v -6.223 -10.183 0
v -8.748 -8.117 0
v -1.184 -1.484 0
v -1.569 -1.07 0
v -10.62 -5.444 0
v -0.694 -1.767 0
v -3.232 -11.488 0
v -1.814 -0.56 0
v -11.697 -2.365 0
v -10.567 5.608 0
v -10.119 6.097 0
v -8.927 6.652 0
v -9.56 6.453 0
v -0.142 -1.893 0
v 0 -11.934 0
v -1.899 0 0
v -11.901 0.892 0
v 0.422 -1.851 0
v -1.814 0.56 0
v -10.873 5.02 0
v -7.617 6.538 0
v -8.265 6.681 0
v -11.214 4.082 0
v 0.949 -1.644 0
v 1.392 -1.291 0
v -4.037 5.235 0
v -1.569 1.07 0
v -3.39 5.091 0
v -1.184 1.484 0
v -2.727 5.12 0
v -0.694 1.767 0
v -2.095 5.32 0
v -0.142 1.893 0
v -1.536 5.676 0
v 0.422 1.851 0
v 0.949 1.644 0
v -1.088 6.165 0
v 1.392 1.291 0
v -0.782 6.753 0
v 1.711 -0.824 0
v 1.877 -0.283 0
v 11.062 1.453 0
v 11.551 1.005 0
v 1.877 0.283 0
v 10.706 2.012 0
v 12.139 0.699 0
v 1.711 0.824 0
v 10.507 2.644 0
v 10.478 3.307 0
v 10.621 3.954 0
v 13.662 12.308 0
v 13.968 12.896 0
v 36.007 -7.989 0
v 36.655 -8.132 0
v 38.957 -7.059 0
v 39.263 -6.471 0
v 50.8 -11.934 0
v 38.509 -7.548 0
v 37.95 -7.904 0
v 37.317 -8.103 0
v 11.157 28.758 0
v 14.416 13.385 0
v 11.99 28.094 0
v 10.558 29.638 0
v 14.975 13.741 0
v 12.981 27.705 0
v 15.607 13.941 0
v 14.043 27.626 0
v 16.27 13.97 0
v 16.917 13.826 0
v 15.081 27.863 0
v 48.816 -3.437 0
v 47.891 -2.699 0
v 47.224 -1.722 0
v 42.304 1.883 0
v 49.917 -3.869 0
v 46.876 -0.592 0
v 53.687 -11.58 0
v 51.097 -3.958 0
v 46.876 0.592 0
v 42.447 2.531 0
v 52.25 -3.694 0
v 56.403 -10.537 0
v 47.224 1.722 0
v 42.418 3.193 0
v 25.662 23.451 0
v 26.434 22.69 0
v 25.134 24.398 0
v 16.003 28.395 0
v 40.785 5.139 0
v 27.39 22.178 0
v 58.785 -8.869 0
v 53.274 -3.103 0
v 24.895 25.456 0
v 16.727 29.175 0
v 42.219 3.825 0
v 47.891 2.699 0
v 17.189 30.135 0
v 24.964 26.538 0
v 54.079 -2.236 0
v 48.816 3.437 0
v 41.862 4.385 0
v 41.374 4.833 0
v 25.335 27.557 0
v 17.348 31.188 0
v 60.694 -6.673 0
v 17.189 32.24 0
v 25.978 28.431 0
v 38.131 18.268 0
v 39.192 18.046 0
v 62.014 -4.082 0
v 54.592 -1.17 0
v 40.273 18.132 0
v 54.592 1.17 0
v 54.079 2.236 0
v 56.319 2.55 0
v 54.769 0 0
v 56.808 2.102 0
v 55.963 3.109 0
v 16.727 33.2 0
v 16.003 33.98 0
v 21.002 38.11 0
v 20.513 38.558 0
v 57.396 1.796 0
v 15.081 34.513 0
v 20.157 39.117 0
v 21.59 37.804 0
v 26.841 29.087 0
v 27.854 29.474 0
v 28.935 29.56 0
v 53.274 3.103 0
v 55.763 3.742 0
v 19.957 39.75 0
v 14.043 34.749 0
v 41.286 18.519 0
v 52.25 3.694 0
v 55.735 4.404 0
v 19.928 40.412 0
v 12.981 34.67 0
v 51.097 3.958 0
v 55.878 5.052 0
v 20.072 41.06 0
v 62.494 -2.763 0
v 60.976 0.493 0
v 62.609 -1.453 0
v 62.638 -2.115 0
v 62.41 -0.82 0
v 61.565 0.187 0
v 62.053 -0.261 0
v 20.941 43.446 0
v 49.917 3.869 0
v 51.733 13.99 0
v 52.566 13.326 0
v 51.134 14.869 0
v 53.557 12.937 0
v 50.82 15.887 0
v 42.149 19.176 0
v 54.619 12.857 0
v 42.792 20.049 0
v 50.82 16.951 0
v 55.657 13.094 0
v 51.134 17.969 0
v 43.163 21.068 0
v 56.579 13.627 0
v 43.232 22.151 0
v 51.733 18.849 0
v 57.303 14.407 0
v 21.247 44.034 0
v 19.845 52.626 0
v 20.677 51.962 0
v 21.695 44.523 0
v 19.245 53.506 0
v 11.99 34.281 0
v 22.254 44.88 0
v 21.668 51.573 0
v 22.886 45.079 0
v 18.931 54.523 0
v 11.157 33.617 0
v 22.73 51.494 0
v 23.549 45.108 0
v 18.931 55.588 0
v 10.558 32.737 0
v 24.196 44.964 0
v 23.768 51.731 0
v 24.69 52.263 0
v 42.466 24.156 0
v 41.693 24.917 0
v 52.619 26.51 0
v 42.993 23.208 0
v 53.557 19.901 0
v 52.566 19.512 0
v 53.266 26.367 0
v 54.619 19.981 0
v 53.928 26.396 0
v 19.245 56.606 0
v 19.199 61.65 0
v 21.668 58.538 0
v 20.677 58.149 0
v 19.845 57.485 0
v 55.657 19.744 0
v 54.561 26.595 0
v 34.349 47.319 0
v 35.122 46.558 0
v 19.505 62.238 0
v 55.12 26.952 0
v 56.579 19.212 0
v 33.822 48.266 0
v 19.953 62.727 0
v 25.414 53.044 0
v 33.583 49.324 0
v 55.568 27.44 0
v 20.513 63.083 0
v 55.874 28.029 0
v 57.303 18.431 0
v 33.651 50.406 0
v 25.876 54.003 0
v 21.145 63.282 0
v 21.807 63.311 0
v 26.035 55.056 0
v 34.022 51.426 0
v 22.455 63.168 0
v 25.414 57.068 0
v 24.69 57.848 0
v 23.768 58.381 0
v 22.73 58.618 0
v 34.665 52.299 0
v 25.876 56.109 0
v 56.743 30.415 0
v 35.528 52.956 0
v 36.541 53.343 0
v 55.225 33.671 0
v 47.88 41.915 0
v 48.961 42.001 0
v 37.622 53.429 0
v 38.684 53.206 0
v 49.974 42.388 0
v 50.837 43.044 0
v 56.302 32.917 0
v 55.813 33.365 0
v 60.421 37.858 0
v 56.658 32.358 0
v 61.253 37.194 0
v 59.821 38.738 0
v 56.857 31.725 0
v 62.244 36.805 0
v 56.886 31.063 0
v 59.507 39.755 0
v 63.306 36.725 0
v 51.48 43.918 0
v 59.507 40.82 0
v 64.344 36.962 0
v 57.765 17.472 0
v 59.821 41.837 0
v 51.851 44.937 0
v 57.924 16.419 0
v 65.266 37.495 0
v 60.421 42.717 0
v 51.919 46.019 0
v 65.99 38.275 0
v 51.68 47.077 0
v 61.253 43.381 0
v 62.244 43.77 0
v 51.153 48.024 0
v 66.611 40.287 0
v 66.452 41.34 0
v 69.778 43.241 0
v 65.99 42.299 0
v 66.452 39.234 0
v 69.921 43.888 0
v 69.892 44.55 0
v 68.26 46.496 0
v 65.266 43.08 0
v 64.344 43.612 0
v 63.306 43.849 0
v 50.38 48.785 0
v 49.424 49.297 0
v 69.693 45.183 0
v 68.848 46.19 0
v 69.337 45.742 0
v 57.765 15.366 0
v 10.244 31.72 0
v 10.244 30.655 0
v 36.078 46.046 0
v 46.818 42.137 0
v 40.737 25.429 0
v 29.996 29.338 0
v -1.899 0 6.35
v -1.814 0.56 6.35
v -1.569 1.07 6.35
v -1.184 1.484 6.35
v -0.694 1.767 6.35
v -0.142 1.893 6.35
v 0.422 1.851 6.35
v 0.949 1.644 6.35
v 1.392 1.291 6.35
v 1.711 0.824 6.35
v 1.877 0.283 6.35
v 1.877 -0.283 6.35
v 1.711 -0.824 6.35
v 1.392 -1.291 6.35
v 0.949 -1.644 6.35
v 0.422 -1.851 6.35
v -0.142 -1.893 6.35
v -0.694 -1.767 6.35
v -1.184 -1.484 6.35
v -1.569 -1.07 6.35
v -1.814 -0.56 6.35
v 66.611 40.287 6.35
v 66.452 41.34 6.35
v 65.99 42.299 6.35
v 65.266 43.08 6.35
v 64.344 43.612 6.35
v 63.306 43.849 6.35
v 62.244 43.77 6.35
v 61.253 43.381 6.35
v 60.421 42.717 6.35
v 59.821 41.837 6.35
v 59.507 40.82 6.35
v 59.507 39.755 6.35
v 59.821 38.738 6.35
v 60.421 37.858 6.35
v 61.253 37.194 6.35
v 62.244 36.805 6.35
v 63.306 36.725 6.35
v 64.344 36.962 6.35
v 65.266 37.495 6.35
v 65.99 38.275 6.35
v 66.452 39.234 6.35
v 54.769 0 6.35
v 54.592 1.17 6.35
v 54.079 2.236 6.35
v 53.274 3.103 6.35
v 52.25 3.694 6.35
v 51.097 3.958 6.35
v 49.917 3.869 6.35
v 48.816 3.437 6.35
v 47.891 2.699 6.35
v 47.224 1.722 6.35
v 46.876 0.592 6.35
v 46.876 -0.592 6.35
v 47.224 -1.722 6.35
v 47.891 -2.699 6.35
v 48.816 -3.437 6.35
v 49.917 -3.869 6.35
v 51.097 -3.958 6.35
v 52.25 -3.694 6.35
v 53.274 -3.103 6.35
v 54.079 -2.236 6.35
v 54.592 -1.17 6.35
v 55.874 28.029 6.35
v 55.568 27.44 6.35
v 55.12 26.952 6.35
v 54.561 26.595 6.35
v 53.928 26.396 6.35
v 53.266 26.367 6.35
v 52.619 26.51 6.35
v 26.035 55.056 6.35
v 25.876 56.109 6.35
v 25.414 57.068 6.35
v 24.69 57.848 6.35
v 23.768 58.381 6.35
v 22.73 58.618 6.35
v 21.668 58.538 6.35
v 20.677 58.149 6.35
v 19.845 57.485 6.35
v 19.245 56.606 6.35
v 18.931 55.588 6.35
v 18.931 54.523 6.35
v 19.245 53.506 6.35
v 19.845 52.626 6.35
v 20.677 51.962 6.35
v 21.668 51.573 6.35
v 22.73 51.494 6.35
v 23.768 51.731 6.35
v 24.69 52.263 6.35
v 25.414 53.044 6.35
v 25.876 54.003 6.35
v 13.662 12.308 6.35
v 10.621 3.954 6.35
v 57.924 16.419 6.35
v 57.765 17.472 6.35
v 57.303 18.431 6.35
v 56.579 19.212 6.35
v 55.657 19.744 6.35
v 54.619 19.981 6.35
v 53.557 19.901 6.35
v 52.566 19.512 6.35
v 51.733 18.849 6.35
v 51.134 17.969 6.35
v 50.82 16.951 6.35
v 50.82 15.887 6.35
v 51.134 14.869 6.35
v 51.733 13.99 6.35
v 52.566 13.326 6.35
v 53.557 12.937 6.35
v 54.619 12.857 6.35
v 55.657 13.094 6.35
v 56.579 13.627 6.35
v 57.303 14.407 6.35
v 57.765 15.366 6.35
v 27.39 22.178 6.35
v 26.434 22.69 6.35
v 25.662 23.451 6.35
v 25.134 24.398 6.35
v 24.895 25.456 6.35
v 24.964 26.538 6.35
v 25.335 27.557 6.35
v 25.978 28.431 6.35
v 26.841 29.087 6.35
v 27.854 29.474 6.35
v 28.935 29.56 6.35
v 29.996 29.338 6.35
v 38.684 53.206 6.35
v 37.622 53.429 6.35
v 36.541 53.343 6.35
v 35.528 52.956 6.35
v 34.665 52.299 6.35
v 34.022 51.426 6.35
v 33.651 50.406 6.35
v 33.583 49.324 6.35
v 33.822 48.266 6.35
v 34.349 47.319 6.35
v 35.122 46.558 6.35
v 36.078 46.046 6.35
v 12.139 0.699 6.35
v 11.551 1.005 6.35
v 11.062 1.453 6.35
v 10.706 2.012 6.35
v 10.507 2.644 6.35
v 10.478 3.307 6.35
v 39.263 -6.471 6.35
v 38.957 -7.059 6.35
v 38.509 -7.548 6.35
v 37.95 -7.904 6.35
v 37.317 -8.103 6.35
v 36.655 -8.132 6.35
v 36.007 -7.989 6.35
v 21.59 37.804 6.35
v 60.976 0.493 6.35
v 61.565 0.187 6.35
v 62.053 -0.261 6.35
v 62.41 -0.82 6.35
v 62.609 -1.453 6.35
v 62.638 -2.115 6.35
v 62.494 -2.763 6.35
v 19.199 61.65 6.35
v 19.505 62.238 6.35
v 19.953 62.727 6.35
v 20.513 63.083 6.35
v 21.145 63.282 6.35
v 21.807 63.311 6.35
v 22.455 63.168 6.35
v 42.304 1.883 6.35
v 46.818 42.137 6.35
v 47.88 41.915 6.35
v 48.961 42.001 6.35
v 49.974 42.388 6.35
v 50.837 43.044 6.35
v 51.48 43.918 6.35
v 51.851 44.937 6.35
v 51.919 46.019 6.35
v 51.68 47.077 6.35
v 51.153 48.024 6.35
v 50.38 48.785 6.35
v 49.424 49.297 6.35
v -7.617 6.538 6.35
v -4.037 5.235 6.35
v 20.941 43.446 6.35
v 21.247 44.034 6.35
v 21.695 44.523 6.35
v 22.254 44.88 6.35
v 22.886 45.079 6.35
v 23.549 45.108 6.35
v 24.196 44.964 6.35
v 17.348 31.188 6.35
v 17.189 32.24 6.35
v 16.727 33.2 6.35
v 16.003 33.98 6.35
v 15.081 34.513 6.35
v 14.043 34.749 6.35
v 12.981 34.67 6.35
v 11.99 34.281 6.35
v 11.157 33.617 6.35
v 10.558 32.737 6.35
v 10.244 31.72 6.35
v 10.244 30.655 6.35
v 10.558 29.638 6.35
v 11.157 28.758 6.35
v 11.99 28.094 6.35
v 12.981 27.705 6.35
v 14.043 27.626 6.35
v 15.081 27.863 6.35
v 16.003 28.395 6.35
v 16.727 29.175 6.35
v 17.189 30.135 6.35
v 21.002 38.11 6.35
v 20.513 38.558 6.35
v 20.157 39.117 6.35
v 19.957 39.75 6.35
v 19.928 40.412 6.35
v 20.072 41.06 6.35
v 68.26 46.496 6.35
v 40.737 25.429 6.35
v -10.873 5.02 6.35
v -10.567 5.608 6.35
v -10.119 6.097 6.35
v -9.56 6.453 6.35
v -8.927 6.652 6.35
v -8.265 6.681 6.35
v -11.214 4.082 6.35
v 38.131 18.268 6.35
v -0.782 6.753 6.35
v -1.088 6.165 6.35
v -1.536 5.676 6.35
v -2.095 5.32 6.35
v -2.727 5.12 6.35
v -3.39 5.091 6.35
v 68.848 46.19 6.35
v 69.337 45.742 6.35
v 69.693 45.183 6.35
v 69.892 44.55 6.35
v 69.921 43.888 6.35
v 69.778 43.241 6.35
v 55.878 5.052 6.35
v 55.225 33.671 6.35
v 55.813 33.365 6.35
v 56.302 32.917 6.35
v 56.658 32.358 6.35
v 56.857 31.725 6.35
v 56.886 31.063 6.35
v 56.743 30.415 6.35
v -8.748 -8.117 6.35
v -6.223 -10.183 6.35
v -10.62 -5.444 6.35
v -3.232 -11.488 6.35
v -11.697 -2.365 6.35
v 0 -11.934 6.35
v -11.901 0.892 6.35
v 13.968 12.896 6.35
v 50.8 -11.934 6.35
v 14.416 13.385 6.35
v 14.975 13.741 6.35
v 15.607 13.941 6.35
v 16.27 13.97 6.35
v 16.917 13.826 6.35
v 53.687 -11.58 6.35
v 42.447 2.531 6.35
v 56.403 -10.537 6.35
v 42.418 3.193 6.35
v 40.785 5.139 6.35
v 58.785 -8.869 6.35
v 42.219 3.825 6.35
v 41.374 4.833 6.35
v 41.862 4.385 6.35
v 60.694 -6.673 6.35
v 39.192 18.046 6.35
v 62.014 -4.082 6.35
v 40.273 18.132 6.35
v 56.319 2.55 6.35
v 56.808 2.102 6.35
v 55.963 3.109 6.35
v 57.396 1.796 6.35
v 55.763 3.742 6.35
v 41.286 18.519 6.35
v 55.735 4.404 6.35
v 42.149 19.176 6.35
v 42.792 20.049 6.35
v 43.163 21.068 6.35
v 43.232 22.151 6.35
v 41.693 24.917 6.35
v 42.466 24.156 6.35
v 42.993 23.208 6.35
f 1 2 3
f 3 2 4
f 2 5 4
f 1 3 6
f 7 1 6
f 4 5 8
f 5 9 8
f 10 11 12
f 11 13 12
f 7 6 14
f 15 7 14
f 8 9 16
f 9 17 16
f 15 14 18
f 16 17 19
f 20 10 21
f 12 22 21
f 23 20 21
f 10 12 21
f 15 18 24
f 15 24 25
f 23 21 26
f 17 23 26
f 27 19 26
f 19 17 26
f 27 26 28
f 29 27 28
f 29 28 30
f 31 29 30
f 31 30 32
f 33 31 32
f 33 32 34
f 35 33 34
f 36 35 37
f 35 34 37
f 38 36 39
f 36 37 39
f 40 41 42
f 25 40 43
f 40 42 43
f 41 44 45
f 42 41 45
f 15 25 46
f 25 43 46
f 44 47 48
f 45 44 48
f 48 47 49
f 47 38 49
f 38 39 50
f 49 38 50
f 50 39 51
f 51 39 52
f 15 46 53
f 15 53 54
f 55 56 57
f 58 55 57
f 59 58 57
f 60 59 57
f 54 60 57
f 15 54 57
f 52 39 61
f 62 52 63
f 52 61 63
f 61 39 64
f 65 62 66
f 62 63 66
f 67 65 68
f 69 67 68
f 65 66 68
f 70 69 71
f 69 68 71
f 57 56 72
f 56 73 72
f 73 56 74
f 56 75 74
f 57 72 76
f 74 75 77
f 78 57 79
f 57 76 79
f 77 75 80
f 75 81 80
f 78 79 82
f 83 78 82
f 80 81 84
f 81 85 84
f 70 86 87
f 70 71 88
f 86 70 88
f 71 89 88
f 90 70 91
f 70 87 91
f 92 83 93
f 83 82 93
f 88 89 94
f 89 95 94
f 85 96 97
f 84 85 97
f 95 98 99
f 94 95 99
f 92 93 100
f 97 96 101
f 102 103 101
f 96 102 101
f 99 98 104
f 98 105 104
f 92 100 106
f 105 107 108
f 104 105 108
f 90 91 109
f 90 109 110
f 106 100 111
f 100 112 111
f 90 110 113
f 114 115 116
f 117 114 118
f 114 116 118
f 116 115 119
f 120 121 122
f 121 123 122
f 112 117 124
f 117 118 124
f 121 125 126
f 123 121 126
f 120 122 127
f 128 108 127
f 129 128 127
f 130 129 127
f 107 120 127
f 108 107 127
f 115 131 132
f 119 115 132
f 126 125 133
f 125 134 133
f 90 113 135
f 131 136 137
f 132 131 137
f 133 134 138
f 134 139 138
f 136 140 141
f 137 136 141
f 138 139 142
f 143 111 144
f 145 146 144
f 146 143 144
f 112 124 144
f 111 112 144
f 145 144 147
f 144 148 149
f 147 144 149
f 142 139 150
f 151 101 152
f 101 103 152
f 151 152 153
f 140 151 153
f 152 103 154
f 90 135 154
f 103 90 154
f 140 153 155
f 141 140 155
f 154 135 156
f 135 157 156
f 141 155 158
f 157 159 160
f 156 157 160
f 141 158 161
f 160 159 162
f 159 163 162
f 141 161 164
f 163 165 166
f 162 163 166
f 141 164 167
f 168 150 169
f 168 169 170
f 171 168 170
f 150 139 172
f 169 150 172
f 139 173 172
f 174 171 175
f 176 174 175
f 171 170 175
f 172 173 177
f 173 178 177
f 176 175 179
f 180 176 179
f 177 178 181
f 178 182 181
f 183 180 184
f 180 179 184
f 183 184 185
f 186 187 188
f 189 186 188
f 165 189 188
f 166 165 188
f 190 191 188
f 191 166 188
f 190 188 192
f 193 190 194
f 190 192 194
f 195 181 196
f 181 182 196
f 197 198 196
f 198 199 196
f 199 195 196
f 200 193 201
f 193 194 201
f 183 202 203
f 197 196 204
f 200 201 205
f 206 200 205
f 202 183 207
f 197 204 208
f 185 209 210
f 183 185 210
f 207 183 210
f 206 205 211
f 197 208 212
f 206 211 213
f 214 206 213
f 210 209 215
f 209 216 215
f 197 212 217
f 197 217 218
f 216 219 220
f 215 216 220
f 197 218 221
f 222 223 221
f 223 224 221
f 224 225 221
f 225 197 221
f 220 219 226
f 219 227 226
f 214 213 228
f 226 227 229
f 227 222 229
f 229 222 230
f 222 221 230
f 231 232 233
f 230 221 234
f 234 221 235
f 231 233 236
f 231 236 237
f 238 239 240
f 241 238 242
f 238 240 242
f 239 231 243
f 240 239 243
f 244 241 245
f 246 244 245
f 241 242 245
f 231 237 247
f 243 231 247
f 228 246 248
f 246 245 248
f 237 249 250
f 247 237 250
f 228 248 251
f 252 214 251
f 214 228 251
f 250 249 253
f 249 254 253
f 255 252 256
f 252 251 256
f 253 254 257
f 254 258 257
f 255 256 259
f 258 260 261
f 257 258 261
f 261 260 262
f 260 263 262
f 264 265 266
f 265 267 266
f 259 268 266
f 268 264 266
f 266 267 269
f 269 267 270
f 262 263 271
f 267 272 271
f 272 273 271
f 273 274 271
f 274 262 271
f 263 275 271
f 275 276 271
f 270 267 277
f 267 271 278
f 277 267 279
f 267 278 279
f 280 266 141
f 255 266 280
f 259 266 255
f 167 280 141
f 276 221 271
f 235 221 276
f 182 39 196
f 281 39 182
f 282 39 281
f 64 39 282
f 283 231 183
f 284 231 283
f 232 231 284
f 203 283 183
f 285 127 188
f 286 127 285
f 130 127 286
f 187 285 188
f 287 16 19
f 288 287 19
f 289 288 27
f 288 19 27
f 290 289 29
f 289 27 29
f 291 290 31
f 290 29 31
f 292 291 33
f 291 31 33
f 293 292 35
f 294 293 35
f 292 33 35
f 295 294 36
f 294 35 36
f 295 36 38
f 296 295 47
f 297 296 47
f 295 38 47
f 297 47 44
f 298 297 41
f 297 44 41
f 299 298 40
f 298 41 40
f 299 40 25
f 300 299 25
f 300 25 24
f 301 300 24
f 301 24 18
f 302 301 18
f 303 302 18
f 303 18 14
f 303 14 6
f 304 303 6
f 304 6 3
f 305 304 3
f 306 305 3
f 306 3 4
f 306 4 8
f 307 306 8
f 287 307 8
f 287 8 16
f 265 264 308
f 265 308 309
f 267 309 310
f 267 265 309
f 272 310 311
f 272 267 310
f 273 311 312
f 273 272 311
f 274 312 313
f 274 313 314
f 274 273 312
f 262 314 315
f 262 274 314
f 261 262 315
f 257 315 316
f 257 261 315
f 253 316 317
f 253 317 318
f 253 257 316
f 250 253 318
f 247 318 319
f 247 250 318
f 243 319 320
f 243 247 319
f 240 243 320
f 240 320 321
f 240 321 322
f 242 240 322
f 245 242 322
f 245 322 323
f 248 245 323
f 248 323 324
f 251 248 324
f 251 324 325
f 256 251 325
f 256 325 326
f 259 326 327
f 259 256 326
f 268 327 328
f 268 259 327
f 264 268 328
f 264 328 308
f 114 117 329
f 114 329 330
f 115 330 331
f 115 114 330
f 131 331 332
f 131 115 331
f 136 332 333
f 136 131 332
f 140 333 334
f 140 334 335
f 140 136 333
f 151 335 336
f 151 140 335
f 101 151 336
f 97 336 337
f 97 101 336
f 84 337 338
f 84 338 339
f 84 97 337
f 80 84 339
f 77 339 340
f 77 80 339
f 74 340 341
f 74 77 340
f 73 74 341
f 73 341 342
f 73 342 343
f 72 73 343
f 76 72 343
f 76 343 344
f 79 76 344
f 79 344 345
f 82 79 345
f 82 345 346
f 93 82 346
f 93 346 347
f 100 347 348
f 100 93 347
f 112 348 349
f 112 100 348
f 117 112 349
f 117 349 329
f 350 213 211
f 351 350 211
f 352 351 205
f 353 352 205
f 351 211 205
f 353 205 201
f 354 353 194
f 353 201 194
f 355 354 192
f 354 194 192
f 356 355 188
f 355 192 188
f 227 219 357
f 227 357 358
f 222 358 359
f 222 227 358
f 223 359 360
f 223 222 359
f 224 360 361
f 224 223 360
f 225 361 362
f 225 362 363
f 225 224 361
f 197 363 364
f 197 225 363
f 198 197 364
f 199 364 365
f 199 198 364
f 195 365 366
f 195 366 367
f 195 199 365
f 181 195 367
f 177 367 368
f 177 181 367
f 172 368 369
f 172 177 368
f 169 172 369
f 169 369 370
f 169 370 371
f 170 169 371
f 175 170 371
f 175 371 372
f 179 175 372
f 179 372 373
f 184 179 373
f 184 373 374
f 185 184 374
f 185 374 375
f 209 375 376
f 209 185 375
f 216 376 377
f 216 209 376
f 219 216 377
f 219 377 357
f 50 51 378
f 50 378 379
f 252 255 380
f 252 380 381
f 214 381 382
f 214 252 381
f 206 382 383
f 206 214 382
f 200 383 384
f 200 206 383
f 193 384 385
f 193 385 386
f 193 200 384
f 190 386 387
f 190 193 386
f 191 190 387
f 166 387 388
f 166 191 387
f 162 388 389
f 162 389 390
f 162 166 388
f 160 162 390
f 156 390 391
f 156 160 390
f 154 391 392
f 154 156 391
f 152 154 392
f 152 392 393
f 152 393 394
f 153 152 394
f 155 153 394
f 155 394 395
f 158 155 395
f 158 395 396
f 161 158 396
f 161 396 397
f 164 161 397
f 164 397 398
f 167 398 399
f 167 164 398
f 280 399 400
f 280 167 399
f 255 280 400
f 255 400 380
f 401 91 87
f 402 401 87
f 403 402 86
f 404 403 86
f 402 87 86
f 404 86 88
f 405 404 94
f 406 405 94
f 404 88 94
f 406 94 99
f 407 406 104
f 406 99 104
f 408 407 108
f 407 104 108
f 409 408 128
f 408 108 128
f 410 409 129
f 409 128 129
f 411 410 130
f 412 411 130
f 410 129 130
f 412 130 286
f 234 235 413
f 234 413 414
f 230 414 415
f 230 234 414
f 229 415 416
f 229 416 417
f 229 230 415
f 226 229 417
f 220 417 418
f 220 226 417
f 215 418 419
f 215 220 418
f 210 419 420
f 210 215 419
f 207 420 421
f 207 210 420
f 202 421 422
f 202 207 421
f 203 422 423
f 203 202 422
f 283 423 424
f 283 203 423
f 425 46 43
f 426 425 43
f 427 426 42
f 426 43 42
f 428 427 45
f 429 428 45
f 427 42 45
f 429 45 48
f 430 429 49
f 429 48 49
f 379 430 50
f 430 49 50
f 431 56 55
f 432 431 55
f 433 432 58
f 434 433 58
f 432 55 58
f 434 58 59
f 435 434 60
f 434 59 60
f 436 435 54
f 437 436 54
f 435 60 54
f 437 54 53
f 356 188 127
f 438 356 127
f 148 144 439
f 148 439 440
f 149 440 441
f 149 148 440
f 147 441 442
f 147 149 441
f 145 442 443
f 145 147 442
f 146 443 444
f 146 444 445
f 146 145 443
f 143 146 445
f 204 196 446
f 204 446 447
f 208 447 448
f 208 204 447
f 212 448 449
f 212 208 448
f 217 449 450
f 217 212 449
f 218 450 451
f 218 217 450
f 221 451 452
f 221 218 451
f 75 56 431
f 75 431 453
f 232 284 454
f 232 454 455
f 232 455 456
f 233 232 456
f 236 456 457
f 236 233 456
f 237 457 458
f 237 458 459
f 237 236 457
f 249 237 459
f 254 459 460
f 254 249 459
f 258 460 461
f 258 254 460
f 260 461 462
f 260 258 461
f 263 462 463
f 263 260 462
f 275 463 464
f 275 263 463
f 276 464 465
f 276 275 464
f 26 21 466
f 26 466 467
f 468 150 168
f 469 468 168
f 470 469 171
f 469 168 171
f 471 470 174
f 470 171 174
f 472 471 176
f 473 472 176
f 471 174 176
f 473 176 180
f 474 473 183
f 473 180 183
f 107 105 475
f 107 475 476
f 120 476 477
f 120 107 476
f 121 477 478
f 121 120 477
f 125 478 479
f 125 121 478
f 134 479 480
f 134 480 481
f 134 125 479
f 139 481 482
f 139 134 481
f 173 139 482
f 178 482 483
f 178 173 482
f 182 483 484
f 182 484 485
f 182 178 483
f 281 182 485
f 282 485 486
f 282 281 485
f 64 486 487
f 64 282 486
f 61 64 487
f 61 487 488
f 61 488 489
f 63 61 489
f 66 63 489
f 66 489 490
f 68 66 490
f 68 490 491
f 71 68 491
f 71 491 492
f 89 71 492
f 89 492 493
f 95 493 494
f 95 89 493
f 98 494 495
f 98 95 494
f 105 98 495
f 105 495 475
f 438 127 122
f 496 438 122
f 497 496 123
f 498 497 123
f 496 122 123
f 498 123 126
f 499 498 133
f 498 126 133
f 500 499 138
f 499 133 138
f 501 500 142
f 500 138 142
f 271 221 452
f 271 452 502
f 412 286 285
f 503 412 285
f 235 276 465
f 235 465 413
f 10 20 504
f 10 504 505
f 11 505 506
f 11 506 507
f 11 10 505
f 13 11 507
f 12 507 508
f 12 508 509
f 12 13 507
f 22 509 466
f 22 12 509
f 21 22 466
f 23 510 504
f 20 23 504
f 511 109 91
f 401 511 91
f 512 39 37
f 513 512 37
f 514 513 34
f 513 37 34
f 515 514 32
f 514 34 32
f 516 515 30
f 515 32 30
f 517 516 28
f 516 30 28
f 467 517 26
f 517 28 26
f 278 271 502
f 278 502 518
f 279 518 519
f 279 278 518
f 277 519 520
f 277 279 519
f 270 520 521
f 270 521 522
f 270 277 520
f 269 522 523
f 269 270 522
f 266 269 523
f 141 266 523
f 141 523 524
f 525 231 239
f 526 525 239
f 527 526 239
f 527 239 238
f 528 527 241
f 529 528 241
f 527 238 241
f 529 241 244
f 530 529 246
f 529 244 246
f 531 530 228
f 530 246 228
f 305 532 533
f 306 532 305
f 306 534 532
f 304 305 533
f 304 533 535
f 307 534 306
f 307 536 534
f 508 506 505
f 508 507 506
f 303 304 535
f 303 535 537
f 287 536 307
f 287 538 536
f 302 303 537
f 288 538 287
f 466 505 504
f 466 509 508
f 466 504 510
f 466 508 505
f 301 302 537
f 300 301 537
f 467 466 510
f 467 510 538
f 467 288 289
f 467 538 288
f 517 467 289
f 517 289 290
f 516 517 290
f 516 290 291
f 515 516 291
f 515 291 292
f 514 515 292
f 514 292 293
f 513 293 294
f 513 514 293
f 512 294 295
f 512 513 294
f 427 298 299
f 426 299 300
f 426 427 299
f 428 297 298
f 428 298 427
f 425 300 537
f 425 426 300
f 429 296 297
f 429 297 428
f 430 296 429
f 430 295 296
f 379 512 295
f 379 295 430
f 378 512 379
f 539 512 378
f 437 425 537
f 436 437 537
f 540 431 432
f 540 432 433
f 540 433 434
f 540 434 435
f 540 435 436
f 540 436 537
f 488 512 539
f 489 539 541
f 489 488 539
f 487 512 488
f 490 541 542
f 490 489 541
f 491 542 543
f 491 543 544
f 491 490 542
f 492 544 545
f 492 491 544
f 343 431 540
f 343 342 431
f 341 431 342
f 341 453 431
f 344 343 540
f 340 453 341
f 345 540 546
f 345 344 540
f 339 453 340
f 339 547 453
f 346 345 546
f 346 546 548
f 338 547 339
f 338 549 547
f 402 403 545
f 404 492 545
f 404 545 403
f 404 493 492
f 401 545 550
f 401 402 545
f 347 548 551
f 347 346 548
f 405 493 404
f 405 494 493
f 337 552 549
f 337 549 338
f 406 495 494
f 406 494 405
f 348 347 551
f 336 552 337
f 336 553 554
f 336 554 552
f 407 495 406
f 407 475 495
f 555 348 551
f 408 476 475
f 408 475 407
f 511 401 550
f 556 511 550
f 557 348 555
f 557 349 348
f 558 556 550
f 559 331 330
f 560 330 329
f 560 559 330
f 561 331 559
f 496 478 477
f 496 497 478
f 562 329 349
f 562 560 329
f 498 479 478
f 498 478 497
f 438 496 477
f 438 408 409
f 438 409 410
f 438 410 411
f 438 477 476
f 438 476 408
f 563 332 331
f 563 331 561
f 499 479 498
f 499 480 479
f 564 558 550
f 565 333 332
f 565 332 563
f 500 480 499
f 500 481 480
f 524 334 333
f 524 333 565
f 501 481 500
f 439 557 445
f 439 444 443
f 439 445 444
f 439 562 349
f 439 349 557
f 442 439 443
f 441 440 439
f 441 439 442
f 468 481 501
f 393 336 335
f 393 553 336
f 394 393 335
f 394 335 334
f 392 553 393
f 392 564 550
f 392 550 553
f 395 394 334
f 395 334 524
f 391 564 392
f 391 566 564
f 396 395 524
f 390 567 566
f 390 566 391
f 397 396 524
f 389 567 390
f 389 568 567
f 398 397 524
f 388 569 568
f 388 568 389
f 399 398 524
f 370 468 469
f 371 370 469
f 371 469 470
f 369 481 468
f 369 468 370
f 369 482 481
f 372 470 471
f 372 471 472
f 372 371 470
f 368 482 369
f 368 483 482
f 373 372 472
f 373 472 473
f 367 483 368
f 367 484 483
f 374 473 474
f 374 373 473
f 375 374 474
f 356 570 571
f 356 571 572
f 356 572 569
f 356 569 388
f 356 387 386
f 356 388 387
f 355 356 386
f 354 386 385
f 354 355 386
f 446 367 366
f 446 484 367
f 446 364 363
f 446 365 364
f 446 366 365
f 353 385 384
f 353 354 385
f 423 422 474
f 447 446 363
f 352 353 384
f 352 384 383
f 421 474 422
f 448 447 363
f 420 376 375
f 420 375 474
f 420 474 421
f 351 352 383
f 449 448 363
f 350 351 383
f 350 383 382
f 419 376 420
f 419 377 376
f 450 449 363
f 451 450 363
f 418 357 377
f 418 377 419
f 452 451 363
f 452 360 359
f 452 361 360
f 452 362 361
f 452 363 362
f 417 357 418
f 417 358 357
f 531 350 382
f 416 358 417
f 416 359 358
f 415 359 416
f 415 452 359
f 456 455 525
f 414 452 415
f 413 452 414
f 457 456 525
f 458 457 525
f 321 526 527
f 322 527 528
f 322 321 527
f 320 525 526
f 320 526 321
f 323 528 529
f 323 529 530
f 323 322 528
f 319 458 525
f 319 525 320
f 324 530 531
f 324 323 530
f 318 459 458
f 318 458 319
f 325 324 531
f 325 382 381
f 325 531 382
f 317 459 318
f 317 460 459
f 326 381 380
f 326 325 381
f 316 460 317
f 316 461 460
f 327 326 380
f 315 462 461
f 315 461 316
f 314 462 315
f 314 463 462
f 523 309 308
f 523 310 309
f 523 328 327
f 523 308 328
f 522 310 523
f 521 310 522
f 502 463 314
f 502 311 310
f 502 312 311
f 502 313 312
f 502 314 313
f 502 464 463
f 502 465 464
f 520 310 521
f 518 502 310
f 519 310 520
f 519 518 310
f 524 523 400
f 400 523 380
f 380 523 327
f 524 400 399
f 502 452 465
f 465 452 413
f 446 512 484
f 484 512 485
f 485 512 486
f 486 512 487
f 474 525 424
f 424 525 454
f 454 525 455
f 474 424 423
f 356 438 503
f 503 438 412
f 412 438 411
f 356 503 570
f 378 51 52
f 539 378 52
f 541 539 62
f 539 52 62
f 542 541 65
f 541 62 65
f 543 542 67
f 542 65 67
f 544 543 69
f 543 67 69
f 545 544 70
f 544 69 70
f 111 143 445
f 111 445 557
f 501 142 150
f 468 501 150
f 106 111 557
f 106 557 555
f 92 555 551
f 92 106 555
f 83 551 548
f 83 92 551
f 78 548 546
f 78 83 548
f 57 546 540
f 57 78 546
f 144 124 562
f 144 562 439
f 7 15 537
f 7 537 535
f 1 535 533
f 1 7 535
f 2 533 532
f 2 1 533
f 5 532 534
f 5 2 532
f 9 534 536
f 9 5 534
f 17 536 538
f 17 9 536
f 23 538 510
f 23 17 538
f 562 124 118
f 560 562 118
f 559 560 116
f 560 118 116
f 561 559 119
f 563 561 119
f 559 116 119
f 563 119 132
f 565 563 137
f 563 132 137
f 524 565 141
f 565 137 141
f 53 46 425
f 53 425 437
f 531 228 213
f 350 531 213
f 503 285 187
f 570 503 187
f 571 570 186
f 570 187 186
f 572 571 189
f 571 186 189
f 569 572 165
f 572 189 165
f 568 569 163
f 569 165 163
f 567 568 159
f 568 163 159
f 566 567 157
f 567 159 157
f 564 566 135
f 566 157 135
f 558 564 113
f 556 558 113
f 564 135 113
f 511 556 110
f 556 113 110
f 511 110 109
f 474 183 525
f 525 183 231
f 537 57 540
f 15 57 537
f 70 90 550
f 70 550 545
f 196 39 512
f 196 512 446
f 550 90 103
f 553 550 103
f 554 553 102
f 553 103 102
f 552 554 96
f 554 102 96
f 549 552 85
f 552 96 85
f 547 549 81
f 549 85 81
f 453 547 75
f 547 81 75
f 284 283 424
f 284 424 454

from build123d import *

# Parameters (mm, degrees)
SKETCH_1_R             = 3.96875
SKETCH_1_R_2           = 3.571875
BOSS_EXTRUDE1_DEPTH    = 6.35
FILLET1_R              = 2.54
F_10_24_TAPPED_HOLE1_D = 3.7973


with BuildPart() as part:
    # 草图1 → Boss-Extrude1 (new body)
    with BuildSketch(Plane.XY):
        with BuildLine():
            Line((-10.004213371, 7.406614284), (-11.214382662, 4.081701485))
            ThreePointArc((-11.214382662, 4.081701485), (-9.775839758, -6.845116691), (0, -11.934096761))
            Line((0, -11.934096761), (50.8, -11.934096761))
            ThreePointArc((50.8, -11.934096761), (57.645116629, -9.775839801), (62.014382214, -4.081701322))
            Line((62.014382214, -4.081701322), (63.363198014, -0.375860367))
            Line((63.363198014, -0.375860367), (55.009330616, 2.664698708))
            Line((55.009330616, 2.664698708), (70.64649272, 45.627444911))
            Line((70.64649272, 45.627444911), (20.067934728, 64.036536047))
            Line((20.067934728, 64.036536047), (-1.650345972, 4.36605521))
            Line((-1.650345972, 4.36605521), (-10.004213371, 7.406614284))
        make_face()
        Polygon((9.752383236, 1.567306626), (14.530404991, 14.694812411), (43.172235793, 4.270037674), (38.394214039, -8.85746811), align=None, mode=Mode.SUBTRACT)
        with Locations((50.8, 0)):
            Circle(SKETCH_1_R, mode=Mode.SUBTRACT)
        with BuildLine():
            ThreePointArc((27.390267642, 22.177756856), (25.113135634, 27.061082549), (29.996461326, 29.338214557))
            Line((29.996461326, 29.338214557), (40.737147877, 25.428924031))
            ThreePointArc((40.737147877, 25.428924031), (43.014279885, 20.545598338), (38.130954193, 18.26846633))
            Line((38.130954193, 18.26846633), (27.390267642, 22.177756856))
        make_face(mode=Mode.SUBTRACT)
        with Locations((54.351671245, 16.419125005)):
            Circle(SKETCH_1_R_2, mode=Mode.SUBTRACT)
        with Locations((13.775744275, 31.187555882)):
            Circle(SKETCH_1_R_2, mode=Mode.SUBTRACT)
        with Locations((22.463055915, 55.05574845)):
            Circle(SKETCH_1_R_2, mode=Mode.SUBTRACT)
        Polygon((19.203122807, 38.672691971), (21.809316491, 45.833149672), (57.611604993, 32.802181251), (55.005411309, 25.641723551), align=None, mode=Mode.SUBTRACT)
        with Locations((63.038982885, 40.287317573)):
            Circle(SKETCH_1_R_2, mode=Mode.SUBTRACT)
        with BuildLine():
            Line((46.818265834, 42.136658898), (36.077579283, 46.045949424))
            ThreePointArc((36.077579283, 46.045949424), (33.800447275, 50.929275117), (38.683772967, 53.206407125))
            Line((38.683772967, 53.206407125), (49.424459518, 49.297116599))
            ThreePointArc((49.424459518, 49.297116599), (51.701591526, 44.413790906), (46.818265834, 42.136658898))
        make_face(mode=Mode.SUBTRACT)
    extrude(amount=BOSS_EXTRUDE1_DEPTH)

    # Fillet1
    fillet1_edges = [part.edges().sort_by_distance(p)[0] for p in [
        (43.172235793, 4.270037674, 3.175),
        (38.394214039, -8.85746811, 3.175),
        (9.752383236, 1.567306626, 3.175),
        (14.530404991, 14.694812411, 3.175),
        (-1.650345972, 4.36605521, 3.175),
        (55.009330616, 2.664698708, 3.175),
        (55.005411309, 25.641723551, 3.175),
        (57.611604993, 32.802181251, 3.175),
        (19.203122807, 38.672691971, 3.175),
        (21.809316491, 45.833149672, 3.175),
        (70.64649272, 45.627444911, 3.175),
        (20.067934728, 64.036536047, 3.175),
        (-10.004213371, 7.406614284, 3.175),
        (63.363198014, -0.375860367, 3.175),
    ]]
    fillet(fillet1_edges, radius=FILLET1_R)

    # #10-24 Tapped Hole1 (through all)
    with Locations(Plane.XY.offset(6.35)):
        with Locations((0, 0)):
            Hole(F_10_24_TAPPED_HOLE1_D / 2)


solid = part.part
